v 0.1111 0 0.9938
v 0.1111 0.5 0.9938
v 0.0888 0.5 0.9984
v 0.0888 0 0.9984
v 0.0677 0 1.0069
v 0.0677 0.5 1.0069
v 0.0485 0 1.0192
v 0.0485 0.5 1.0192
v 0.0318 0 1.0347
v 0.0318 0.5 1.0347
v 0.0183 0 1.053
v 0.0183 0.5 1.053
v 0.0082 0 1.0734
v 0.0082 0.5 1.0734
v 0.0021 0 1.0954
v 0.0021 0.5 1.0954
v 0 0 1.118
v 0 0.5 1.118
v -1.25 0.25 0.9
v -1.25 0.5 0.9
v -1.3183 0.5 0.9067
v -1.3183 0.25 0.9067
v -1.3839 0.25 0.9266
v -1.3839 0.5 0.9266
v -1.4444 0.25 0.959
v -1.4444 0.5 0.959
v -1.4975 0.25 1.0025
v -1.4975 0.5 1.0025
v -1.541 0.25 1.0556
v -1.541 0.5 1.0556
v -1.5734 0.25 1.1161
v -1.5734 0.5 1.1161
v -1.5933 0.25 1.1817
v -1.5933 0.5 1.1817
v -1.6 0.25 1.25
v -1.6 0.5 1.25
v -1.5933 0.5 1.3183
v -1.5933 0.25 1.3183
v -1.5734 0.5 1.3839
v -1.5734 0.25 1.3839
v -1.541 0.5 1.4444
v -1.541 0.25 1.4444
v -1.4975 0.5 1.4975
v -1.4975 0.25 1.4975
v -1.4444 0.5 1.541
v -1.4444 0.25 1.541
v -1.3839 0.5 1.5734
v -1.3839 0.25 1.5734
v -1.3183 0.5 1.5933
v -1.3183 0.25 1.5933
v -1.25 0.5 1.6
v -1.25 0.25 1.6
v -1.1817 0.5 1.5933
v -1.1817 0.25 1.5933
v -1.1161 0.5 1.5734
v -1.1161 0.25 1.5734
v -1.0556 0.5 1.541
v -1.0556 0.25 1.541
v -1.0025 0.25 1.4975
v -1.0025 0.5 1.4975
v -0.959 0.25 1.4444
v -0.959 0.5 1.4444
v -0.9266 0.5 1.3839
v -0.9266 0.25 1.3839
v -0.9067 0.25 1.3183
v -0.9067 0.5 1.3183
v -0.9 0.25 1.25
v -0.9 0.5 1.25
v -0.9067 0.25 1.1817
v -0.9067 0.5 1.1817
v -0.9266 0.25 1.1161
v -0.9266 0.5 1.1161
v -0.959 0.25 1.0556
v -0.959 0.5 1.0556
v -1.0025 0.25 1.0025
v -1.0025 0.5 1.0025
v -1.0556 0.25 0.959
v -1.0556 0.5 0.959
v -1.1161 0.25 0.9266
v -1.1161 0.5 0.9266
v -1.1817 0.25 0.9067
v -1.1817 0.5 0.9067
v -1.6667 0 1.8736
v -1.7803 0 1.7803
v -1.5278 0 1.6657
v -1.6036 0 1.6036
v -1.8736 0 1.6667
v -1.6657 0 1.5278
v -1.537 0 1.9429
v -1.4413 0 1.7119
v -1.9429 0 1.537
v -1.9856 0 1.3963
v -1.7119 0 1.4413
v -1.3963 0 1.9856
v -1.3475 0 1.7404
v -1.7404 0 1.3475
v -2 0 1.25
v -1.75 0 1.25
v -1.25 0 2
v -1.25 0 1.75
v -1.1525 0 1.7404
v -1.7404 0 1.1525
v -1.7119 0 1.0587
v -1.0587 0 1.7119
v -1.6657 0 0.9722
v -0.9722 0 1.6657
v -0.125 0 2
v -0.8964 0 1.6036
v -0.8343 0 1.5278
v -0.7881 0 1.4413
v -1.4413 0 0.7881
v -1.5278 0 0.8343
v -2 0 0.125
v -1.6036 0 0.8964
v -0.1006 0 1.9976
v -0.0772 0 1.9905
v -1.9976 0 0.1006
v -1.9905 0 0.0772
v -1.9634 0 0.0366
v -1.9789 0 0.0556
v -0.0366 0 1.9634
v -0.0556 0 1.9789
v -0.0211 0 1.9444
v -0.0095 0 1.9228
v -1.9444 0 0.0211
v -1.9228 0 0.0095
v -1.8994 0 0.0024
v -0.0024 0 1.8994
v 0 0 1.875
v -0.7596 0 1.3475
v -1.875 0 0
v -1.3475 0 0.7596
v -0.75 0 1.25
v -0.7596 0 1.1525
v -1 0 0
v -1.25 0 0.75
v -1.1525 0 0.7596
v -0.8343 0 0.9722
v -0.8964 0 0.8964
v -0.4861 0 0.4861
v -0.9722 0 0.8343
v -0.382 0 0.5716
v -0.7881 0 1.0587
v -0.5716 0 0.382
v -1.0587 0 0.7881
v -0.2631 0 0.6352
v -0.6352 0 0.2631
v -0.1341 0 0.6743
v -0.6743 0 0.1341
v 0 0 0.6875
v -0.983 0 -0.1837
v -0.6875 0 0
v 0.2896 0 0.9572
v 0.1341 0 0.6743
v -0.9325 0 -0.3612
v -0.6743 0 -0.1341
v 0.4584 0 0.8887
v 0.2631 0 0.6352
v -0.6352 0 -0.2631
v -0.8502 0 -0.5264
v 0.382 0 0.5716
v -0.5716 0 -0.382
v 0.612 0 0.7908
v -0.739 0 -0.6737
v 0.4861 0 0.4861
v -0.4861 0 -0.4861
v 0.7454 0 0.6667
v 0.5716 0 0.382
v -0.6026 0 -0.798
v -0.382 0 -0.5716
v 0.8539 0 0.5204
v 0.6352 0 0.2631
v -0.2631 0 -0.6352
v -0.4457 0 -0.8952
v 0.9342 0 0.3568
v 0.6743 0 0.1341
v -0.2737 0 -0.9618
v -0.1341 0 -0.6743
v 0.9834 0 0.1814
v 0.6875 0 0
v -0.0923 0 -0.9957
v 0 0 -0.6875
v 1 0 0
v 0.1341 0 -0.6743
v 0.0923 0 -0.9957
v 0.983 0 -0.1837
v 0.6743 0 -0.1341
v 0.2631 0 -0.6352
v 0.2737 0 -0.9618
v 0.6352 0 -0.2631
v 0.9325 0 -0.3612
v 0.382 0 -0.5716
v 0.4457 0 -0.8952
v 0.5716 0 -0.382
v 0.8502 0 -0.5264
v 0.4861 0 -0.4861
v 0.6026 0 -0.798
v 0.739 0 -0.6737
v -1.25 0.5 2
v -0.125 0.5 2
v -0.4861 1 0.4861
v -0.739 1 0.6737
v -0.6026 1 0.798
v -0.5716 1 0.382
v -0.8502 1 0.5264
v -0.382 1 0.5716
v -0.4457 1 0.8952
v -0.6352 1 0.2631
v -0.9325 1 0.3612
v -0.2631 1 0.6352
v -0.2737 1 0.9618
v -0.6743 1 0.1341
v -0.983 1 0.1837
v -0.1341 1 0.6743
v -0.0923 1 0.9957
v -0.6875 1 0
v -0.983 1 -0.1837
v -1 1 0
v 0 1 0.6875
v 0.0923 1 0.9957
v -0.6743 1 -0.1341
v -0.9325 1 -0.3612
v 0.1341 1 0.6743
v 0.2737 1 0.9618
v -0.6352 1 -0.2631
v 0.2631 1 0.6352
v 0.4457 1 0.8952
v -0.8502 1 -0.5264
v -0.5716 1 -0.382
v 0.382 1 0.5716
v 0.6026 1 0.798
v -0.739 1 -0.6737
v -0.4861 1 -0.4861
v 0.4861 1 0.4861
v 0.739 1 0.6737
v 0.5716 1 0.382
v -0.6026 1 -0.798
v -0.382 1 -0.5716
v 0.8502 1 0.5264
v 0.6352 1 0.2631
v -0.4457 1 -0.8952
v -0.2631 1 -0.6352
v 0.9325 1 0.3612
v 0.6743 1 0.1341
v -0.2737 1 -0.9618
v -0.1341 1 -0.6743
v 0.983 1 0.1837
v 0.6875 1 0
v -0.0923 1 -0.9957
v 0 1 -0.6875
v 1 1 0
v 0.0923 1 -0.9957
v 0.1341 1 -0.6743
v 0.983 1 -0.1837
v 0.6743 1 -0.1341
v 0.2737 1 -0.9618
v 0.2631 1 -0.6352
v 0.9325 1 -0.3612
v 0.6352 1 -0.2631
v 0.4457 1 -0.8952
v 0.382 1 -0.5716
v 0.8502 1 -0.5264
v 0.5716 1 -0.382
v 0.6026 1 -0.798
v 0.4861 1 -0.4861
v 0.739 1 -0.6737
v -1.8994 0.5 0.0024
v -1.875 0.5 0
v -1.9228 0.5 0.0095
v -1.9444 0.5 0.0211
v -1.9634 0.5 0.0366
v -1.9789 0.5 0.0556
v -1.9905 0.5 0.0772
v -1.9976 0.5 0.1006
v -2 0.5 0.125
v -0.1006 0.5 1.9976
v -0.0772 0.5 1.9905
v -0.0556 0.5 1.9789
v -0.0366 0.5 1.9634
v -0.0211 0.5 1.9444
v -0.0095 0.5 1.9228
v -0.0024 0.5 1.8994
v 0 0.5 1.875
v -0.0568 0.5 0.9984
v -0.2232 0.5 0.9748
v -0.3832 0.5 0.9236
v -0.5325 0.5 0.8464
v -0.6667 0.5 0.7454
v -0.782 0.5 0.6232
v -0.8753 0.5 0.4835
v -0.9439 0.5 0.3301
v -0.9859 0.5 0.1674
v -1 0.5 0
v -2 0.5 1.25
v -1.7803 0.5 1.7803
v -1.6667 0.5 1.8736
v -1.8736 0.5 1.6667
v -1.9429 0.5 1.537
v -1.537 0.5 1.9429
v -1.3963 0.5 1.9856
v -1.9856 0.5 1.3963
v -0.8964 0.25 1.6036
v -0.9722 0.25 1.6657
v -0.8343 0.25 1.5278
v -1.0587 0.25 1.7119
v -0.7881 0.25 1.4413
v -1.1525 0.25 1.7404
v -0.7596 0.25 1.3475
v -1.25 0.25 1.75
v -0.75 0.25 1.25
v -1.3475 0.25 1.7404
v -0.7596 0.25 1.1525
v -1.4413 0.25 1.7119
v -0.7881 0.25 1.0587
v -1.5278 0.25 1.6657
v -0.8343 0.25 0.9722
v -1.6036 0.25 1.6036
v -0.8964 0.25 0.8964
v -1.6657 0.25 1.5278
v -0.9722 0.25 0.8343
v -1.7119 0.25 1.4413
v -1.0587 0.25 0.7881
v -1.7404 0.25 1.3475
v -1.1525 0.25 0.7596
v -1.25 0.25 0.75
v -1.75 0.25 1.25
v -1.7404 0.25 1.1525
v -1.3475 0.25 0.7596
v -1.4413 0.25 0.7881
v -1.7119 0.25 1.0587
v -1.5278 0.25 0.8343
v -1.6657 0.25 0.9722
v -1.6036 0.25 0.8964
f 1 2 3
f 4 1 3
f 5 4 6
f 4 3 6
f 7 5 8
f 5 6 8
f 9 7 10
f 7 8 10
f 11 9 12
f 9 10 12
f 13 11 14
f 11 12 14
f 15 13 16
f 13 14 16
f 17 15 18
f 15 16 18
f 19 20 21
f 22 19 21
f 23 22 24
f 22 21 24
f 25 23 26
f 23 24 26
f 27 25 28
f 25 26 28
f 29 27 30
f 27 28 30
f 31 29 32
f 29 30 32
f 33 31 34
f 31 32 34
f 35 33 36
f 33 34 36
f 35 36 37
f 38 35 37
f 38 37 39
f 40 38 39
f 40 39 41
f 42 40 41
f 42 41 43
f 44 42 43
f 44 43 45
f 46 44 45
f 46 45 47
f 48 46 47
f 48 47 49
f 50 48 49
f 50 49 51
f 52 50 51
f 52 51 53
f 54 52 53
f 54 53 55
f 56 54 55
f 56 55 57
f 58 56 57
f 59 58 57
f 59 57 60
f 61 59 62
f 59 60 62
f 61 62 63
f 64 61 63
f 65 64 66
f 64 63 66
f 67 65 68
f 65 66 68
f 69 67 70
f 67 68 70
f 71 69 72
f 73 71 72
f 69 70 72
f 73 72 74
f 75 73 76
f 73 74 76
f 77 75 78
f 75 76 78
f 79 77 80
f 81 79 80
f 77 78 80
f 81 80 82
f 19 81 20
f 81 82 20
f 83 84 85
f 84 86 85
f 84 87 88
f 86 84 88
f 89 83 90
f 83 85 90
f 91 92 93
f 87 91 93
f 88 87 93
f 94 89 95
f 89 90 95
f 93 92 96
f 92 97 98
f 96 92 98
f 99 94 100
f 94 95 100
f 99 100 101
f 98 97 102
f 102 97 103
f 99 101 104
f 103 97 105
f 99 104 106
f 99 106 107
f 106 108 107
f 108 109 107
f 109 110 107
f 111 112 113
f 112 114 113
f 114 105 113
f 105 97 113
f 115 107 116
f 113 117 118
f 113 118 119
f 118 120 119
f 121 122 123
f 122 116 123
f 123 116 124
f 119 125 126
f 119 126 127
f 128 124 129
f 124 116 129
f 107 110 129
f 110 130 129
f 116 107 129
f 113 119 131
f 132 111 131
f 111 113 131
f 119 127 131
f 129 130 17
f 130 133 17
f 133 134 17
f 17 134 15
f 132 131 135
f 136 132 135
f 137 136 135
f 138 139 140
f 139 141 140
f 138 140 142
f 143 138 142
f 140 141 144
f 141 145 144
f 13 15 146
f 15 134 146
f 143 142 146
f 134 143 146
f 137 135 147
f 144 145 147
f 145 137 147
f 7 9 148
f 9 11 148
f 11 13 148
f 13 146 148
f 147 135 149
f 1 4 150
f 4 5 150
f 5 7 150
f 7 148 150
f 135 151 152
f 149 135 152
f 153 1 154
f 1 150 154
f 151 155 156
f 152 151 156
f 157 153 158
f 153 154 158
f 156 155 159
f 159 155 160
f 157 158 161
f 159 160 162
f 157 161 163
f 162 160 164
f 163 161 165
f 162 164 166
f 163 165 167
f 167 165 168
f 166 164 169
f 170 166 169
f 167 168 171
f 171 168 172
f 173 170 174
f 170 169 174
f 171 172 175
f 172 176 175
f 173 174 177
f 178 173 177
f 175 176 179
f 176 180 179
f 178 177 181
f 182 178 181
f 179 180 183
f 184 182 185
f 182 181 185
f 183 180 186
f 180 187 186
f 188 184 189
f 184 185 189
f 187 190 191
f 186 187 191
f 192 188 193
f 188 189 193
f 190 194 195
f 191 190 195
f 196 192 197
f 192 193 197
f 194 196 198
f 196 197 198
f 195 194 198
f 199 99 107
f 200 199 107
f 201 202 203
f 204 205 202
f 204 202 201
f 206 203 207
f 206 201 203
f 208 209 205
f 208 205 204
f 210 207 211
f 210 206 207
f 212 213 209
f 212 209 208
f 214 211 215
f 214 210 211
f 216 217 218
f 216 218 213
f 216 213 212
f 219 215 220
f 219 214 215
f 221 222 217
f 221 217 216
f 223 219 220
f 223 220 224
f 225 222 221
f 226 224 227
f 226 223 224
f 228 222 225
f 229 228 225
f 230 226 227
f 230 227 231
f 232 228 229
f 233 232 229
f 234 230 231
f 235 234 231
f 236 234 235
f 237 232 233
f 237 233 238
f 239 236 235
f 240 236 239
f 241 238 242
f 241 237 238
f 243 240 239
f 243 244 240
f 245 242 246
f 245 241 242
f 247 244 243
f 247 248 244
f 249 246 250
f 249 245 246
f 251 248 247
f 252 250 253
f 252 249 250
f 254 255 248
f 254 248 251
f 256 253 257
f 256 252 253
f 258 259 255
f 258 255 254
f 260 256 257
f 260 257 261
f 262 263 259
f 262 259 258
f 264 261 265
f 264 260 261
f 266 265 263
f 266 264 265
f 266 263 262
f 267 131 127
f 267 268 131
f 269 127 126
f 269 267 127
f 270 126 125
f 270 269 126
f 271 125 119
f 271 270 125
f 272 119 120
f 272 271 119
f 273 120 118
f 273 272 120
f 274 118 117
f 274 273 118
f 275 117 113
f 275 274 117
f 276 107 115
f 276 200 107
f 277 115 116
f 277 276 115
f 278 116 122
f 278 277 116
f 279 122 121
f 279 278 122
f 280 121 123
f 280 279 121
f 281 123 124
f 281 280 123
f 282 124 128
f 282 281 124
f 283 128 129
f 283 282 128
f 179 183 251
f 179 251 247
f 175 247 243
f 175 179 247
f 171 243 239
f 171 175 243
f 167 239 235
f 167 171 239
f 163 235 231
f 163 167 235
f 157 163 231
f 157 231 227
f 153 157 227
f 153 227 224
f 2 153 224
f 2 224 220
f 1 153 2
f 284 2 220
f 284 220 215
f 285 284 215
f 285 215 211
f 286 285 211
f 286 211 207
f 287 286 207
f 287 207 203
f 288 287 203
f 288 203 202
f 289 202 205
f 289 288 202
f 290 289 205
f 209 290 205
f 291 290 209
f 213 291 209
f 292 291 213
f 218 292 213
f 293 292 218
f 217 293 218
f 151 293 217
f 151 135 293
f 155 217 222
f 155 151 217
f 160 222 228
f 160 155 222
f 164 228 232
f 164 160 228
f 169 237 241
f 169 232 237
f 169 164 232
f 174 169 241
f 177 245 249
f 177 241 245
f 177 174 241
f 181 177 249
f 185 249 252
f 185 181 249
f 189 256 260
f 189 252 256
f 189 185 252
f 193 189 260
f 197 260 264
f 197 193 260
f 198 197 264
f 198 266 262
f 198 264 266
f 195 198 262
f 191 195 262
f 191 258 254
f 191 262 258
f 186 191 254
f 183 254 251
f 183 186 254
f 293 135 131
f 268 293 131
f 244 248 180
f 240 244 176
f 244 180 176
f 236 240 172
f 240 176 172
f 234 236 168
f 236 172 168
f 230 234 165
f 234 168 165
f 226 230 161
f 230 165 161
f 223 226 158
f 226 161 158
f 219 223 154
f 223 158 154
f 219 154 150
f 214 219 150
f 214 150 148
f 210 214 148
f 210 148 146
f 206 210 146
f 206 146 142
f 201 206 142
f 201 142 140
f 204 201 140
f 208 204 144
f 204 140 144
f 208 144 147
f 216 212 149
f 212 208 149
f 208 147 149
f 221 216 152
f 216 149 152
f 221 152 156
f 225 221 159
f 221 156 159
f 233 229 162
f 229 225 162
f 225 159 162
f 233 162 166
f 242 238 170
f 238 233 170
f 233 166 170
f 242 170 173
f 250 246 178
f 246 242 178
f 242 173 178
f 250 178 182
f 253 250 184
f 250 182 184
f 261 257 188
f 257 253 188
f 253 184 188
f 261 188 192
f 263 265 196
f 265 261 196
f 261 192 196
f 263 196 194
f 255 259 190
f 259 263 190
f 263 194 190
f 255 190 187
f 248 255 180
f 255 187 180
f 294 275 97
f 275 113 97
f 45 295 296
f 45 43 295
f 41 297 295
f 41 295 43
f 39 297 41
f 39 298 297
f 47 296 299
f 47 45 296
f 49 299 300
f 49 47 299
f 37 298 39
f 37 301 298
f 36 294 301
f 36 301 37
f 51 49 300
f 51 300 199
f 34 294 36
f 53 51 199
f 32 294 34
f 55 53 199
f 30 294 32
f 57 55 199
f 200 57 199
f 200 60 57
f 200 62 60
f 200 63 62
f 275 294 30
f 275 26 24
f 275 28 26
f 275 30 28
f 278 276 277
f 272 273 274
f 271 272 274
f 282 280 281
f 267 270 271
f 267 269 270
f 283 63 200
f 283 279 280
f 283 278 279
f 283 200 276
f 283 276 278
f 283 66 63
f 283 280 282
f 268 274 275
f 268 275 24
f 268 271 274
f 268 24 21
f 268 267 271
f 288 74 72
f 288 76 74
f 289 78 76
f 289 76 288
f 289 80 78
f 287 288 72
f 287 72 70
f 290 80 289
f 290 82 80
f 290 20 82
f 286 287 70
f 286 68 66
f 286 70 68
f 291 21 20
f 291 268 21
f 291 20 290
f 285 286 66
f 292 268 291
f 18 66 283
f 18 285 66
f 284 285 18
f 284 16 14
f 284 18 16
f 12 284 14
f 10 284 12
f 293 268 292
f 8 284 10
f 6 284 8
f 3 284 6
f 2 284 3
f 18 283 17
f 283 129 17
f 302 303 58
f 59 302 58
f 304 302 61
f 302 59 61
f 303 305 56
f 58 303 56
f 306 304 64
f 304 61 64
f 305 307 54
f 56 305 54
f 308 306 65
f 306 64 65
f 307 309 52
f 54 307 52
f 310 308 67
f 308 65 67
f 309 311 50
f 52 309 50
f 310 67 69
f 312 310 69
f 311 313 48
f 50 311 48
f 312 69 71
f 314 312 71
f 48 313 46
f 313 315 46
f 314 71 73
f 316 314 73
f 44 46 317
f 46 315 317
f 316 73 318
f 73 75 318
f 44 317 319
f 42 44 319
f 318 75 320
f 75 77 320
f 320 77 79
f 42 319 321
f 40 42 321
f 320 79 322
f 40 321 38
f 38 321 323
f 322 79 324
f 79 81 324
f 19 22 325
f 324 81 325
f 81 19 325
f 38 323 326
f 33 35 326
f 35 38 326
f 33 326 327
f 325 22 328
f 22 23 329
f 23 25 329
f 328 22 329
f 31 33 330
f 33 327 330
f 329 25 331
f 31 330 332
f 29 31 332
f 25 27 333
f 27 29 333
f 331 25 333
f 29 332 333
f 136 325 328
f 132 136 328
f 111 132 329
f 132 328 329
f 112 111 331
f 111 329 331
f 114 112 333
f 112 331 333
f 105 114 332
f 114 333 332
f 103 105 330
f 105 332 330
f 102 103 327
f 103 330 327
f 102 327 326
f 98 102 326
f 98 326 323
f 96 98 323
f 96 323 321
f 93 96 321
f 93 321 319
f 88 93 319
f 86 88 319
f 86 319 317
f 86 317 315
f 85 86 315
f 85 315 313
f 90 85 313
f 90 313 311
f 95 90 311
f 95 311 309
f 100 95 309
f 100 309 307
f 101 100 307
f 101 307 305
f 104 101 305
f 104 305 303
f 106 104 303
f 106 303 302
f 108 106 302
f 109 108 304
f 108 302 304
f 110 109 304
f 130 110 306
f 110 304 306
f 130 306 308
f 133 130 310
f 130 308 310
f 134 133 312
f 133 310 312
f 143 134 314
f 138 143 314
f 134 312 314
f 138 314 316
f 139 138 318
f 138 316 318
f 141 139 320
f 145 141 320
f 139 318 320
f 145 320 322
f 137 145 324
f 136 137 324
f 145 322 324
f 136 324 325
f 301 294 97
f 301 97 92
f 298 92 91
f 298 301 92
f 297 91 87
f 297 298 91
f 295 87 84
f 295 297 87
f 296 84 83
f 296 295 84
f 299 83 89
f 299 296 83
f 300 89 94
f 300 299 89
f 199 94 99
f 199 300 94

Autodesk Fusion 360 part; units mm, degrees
sketch "Sketch1" plane through (0, 0, 0) normal (0, 1, 0) x (1, 0, 0)
  circle A0 centre (0, 0) radius 0.6875
  circle A1 centre (0, 0) radius 1
  line L0 (0, 0) -> (-2, 0)
  line L1 (-2, 0) -> (-2, -2)
  line L2 (-2, -2) -> (0, -2)
  line L3 (0, -2) -> (0, 0)
  point P0 (-1.25, -1.25)
  dimension "d1" = 1.375
  dimension "d2" = 2
  dimension "d3" = 2
  dimension "d4" = 2
  dimension "d5" = 1.25
  dimension "d6" = 1.25
extrude "Extrude1" add sketch "Sketch1" along normal blind 1 contours A0 A1 L0 L3 | A0 A1 L0 L3
extrude "Extrude2" add sketch "Sketch1" along normal blind 0.5 contours A1 L0 L1 L2 L3
hole "Hole1" at (-1.25, 0, 1.25) direction (0, 1, 0) diameter 0.7 end through all counterbore diameter 1 counterbore depth 0.25
fillet "Fillet1" radius 0.125 1 edges at (0, 0.25, 1)
fillet "Fillet2" radius 0.125 1 edges at (0, 0.25, 2)
fillet "Fillet3" radius 0.125 1 edges at (-2, 0.25, 0)
fillet "Fillet4" radius 0.75 1 edges at (-2, 0.25, 2)
